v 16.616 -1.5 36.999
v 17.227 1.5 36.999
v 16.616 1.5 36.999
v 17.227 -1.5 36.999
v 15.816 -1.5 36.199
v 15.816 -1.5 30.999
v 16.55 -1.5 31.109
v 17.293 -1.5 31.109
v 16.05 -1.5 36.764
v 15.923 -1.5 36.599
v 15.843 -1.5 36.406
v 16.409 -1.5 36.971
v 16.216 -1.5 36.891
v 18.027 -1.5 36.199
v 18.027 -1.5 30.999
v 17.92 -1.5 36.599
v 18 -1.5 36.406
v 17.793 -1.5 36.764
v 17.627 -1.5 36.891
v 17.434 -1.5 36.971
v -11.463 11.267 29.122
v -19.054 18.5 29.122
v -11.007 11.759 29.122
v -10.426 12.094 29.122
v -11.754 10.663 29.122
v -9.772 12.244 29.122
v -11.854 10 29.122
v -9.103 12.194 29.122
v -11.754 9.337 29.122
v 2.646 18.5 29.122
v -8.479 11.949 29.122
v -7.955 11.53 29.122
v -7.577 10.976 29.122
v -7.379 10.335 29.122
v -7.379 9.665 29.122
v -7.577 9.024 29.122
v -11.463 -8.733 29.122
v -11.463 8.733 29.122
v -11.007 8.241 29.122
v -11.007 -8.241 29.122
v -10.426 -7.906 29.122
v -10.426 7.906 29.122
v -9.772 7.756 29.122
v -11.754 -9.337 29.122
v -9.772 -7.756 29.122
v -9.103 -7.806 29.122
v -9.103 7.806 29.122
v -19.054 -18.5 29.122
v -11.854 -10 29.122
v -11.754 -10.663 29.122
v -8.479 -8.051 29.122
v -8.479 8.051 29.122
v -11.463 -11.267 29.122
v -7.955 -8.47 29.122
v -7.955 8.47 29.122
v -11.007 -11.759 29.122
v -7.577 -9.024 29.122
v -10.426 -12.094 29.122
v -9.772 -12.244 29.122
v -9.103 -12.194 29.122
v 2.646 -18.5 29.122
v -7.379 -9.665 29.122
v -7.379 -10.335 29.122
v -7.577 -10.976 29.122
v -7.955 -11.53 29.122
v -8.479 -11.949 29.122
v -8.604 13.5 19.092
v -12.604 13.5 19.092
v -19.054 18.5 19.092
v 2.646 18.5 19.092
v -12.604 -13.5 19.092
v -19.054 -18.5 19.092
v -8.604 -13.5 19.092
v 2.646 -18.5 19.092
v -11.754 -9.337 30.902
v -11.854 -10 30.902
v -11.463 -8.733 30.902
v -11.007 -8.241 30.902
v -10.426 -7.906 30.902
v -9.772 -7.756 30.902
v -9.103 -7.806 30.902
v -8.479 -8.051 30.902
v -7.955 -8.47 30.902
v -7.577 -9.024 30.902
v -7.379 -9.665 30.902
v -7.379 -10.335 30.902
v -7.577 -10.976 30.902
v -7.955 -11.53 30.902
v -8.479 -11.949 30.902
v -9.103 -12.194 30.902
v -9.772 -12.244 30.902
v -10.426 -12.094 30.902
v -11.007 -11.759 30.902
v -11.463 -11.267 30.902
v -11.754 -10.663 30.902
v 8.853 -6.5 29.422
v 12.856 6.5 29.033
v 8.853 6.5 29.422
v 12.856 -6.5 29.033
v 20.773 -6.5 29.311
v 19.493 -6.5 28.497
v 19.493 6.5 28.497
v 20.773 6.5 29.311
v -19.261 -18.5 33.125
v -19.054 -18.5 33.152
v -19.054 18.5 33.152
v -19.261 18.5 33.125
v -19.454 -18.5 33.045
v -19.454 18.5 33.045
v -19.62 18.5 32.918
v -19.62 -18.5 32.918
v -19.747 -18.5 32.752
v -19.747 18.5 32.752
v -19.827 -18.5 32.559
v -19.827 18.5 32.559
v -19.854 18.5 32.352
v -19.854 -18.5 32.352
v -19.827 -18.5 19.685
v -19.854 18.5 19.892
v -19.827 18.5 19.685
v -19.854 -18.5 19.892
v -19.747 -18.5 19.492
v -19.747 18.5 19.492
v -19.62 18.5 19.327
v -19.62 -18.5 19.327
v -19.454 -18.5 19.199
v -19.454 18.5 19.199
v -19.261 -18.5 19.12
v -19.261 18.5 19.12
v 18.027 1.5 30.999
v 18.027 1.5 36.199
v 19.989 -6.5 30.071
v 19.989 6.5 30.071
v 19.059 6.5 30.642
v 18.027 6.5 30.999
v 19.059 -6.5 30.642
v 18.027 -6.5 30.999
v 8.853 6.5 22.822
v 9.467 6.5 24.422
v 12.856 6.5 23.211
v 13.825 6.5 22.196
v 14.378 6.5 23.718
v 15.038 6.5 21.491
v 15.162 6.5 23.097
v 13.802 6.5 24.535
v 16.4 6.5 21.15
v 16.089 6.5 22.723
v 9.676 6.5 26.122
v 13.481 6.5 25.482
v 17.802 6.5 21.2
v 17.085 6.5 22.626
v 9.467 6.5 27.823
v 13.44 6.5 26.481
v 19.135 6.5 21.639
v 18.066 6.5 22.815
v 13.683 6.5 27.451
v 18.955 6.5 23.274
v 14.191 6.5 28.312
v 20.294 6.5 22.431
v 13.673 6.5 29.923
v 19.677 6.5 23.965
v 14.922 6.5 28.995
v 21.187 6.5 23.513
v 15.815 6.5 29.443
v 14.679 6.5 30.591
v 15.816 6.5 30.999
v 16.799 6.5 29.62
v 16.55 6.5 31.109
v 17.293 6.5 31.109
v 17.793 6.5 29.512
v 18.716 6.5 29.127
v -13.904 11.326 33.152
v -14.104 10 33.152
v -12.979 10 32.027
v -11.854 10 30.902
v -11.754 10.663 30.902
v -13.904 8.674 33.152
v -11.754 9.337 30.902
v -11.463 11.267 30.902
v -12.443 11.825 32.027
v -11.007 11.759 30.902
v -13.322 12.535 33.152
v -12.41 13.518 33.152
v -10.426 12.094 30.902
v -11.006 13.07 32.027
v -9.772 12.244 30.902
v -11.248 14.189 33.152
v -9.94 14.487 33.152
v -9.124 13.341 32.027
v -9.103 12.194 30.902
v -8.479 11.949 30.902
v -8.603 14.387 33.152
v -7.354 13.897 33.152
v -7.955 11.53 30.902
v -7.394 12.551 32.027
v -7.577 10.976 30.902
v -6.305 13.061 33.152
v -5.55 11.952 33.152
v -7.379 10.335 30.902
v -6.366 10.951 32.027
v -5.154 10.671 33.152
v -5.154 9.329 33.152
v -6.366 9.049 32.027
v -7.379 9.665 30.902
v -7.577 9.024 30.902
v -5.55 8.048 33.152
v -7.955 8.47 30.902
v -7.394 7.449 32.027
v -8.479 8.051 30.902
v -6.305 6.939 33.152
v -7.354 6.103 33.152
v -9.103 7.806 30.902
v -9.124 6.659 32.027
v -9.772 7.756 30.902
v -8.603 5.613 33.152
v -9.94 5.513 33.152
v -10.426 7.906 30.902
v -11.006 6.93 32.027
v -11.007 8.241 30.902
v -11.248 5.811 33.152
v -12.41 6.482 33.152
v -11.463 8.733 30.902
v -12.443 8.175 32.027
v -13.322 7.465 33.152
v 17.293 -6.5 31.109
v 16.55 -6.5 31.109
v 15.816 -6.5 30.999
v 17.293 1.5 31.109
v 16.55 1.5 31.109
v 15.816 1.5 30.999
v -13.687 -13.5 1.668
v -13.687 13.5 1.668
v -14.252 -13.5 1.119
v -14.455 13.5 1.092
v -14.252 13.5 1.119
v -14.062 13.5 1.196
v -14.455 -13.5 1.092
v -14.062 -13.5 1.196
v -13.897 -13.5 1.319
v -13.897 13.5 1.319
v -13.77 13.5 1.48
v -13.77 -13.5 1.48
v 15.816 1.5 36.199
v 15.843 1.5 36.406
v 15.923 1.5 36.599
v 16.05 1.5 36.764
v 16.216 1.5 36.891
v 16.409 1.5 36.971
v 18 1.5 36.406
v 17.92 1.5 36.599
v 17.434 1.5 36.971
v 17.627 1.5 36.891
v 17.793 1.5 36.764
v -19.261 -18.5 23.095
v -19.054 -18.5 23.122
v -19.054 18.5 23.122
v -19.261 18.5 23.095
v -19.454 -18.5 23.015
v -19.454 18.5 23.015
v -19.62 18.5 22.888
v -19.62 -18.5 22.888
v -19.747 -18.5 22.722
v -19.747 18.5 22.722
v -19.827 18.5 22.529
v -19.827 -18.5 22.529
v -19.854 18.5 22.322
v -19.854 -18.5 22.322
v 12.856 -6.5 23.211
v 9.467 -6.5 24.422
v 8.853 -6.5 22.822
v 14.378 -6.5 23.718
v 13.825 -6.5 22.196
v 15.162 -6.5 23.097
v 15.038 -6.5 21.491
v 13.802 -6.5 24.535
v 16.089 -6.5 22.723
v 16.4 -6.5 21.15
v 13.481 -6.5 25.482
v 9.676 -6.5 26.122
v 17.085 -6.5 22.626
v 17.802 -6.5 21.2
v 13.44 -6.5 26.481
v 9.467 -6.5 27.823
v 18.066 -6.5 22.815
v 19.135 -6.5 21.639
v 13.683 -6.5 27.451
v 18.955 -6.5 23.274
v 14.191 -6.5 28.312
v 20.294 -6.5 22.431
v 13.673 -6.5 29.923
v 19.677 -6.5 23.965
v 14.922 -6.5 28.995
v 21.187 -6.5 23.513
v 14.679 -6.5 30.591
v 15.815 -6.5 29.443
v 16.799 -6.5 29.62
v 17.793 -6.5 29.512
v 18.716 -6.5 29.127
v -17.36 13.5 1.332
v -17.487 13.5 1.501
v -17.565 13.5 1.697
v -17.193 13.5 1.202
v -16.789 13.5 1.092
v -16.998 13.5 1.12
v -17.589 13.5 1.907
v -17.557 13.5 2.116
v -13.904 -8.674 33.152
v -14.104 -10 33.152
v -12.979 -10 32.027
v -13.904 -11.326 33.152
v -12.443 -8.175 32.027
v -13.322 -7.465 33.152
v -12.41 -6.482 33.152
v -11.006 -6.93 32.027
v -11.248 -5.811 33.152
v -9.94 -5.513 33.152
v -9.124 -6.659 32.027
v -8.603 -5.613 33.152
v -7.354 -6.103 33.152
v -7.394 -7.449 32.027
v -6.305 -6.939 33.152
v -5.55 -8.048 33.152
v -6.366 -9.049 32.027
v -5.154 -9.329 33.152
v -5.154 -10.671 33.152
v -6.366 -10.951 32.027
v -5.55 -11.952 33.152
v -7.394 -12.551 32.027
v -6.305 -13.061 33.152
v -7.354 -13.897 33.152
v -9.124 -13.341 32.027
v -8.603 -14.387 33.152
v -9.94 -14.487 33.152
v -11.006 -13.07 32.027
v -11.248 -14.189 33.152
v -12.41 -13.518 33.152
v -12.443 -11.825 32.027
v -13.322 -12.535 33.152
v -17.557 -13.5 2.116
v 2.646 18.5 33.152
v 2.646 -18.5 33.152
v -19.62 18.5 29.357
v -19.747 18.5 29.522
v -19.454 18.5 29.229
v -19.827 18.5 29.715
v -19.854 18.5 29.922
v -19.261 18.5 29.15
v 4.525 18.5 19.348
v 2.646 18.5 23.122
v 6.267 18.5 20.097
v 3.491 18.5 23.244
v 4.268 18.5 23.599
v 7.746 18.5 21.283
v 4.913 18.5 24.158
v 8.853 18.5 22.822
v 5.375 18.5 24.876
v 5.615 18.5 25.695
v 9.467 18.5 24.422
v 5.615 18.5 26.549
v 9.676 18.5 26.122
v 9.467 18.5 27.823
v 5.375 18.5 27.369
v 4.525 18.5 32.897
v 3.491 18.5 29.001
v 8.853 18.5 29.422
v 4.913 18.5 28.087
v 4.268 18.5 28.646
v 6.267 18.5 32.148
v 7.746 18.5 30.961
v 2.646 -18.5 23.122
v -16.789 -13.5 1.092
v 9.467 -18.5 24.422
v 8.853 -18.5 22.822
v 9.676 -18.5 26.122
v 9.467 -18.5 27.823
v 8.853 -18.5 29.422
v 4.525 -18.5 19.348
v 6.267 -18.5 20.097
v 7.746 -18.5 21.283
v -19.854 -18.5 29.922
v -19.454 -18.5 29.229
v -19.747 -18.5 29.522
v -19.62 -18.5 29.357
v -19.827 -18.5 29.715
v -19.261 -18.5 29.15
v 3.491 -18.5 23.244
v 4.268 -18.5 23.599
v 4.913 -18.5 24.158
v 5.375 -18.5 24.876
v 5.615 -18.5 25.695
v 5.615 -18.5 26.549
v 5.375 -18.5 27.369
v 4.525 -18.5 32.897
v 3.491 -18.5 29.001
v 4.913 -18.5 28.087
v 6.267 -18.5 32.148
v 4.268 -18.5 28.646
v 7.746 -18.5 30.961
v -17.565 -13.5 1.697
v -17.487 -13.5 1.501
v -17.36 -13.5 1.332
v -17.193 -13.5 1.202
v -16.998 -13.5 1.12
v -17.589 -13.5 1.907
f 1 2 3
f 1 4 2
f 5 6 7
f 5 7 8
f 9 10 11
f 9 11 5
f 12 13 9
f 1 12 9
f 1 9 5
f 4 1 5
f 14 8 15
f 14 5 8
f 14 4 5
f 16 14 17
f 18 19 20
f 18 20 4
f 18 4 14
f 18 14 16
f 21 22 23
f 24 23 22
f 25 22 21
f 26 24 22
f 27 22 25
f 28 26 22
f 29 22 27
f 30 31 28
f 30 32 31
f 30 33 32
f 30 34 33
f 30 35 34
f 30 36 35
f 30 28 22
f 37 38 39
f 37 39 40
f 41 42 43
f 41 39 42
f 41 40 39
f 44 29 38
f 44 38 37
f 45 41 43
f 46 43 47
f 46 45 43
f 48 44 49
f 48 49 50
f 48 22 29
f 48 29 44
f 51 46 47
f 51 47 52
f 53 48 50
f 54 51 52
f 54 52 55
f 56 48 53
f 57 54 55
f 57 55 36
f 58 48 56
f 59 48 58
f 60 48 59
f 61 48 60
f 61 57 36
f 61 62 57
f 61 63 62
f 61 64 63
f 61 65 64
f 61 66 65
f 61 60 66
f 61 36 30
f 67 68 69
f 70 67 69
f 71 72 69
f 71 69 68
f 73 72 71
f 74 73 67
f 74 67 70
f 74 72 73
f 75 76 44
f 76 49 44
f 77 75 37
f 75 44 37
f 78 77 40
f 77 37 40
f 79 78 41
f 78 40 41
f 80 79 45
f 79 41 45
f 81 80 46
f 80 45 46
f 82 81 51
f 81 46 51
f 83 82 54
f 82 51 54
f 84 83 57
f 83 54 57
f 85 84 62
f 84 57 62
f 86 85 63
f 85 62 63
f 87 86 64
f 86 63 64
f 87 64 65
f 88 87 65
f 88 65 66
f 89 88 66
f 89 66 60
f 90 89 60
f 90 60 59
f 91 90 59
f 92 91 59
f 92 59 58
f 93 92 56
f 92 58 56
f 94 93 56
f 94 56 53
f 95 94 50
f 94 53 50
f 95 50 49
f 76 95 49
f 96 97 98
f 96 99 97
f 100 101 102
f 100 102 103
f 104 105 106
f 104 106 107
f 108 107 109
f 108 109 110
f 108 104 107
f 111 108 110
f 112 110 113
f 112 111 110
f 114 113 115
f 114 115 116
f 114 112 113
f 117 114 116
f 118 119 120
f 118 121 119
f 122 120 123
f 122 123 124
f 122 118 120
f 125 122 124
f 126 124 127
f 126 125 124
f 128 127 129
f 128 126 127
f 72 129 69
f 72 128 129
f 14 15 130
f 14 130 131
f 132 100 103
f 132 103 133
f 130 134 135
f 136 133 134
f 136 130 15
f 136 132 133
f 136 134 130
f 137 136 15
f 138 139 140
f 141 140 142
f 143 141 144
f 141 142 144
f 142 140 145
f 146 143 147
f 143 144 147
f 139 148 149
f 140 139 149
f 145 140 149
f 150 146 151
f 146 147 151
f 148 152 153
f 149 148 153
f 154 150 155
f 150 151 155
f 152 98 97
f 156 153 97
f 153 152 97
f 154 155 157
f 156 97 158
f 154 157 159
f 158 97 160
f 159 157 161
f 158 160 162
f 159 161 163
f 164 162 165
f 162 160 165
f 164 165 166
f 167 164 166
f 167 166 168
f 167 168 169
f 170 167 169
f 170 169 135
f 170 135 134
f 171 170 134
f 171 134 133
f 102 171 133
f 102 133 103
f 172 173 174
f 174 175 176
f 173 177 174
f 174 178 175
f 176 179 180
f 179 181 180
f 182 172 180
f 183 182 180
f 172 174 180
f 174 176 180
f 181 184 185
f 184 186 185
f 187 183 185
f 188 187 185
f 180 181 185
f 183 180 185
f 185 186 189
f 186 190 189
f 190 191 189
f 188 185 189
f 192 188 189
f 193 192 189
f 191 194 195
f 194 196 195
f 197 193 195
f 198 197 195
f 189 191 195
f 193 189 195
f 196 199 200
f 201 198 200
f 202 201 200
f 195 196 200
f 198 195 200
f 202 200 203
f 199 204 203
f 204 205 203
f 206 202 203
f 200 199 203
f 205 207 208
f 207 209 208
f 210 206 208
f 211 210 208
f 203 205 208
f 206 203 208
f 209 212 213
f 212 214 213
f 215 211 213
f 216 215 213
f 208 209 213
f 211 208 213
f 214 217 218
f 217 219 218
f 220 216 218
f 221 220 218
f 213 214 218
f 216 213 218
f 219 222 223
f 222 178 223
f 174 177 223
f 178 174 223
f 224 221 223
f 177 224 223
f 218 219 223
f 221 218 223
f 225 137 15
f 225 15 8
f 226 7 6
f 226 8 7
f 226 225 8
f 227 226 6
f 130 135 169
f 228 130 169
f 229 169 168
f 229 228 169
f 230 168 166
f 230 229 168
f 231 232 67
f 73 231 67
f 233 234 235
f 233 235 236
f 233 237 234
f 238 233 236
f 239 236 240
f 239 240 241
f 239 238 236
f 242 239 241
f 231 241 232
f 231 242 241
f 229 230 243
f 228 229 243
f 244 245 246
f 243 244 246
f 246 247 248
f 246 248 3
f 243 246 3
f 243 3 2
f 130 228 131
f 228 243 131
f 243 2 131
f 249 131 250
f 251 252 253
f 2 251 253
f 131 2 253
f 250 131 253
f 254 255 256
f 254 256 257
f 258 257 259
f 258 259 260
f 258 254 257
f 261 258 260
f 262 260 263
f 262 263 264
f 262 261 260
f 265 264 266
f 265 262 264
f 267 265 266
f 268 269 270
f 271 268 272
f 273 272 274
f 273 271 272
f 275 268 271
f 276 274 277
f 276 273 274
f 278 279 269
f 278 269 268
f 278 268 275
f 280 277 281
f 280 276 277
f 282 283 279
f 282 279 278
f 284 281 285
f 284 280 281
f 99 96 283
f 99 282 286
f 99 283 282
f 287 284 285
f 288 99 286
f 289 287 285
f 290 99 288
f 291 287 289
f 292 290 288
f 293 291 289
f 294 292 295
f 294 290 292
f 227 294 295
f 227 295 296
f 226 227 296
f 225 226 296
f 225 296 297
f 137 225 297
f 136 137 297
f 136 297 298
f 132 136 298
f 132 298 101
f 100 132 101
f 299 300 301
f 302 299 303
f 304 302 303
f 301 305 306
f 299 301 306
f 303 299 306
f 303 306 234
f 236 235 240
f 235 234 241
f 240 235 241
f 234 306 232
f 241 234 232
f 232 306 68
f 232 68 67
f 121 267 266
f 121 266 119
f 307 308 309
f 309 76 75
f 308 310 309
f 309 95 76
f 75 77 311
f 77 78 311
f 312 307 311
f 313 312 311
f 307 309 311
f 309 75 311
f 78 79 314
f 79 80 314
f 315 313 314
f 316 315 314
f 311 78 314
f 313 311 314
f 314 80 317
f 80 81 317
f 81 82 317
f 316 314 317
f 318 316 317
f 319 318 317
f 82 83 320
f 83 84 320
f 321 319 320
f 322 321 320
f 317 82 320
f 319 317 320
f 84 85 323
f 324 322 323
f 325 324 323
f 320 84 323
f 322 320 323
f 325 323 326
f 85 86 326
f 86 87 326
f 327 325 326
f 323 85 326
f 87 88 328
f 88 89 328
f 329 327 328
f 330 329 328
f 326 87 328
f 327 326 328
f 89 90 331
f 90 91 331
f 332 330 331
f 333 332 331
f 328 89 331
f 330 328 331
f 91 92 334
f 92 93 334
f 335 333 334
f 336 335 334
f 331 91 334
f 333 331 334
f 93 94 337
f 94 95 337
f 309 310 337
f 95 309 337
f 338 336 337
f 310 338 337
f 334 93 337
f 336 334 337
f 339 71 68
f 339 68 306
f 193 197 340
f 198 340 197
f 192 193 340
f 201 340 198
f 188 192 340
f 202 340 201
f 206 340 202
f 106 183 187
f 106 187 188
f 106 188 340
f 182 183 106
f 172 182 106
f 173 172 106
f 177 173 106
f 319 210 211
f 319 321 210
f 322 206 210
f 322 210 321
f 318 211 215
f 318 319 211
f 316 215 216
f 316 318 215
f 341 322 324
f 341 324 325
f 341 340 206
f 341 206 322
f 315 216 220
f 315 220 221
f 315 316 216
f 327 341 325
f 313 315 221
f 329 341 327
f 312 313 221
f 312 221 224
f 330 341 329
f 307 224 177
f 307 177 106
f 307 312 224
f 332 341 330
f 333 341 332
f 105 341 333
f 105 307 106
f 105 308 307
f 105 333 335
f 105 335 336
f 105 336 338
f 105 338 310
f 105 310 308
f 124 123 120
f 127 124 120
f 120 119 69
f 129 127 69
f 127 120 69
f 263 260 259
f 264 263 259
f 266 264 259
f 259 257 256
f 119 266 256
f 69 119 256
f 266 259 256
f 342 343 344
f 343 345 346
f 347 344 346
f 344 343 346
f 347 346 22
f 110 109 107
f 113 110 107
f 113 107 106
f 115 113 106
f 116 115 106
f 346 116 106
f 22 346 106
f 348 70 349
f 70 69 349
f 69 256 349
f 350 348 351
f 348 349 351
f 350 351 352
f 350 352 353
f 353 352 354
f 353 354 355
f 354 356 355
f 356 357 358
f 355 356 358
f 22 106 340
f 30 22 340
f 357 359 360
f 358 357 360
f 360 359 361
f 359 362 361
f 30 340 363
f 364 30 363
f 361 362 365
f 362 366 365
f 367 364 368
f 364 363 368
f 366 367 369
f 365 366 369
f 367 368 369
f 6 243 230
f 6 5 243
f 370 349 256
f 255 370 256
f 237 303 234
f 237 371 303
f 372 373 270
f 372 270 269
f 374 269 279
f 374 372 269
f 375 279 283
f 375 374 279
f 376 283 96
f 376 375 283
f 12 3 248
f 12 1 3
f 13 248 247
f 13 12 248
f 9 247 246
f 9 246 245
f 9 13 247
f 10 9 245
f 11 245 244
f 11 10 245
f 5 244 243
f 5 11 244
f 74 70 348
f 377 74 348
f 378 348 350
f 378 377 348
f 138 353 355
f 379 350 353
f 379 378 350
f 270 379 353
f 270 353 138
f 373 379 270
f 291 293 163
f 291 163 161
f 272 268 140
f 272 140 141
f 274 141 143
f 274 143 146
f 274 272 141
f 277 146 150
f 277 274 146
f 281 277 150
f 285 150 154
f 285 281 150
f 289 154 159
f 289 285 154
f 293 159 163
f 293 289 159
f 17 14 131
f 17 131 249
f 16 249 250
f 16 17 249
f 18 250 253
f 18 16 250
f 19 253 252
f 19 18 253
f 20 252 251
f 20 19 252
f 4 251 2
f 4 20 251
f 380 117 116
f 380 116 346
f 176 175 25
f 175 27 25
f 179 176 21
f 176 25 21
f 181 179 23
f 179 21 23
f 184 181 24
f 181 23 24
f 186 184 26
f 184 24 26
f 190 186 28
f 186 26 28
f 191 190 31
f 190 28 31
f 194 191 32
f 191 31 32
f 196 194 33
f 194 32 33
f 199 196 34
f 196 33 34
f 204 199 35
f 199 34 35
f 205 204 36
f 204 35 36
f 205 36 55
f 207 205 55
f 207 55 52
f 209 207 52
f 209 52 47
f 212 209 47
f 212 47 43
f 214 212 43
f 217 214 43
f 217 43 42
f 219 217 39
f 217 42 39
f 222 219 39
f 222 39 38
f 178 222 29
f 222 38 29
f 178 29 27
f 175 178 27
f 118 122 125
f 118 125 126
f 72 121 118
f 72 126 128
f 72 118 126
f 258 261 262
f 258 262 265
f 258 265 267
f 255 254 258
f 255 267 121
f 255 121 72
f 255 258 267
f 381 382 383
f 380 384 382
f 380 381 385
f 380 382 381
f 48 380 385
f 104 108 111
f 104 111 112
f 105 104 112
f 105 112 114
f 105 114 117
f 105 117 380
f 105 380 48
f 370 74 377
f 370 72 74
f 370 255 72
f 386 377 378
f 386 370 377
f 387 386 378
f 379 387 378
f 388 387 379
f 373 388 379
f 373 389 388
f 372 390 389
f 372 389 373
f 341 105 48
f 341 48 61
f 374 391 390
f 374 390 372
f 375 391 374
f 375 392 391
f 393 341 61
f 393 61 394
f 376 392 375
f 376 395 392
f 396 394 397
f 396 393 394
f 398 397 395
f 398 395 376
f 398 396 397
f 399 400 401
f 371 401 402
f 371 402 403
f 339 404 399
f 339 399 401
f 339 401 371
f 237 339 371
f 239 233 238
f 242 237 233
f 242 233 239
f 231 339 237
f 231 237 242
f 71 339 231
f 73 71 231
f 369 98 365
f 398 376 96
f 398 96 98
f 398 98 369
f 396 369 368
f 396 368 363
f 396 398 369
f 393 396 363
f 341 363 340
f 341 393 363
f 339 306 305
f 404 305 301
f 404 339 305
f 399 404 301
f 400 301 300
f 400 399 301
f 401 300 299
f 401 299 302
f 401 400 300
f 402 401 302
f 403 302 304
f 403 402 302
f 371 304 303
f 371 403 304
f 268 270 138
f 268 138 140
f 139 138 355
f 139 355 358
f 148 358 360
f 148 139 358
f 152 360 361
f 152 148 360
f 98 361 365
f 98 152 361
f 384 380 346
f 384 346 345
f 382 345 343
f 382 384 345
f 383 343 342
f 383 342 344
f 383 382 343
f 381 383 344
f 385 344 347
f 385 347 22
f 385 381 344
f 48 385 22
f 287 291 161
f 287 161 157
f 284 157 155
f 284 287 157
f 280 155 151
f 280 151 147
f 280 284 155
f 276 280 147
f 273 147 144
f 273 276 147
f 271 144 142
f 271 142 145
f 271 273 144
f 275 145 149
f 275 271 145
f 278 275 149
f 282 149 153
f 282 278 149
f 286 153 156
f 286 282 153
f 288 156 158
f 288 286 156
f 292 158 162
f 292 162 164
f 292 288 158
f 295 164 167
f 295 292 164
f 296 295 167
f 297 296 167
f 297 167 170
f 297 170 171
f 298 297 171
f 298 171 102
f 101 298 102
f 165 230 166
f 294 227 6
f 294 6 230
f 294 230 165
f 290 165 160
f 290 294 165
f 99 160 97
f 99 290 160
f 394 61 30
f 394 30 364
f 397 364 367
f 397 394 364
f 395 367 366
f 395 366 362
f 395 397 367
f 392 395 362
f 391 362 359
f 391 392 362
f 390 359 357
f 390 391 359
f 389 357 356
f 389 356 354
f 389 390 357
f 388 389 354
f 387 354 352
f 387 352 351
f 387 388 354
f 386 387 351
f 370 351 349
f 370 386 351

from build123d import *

# Parameters (mm, degrees)
F1_DEPTH       = 18.5
F2_DEPTH       = 6.5
F3_DEPTH       = 1.5
F4_DEPTH       = 13.5
F6_D           = 4.5
F6_DEPTH       = 7
F6_CSINK_D     = 9
F6_CSINK_ANGLE = 90


with BuildPart() as f1:
    # F0 (on Front) → F1 (new body, symmetric)
    with BuildSketch(Plane.XZ):
        with BuildLine():
            Line((-8.603998, 19.092317), (2.646002, 19.092317))
            ThreePointArc((2.646002, 19.092317), (6.266849, 20.096509), (8.853265, 22.822198))
            ThreePointArc((8.853265, 22.822198), (9.676002, 26.122317), (8.853265, 29.422437))
            ThreePointArc((8.853265, 29.422437), (6.266849, 32.148126), (2.646002, 33.152317))
            Line((2.646002, 33.152317), (-19.053998, 33.152317))
            ThreePointArc((-19.053998, 33.152317), (-19.619683, 32.918003), (-19.853998, 32.352317))
            Line((-19.853998, 32.352317), (-19.853998, 29.922317))
            ThreePointArc((-19.853998, 29.922317), (-19.619683, 29.356632), (-19.053998, 29.122317))
            Line((-19.053998, 29.122317), (2.646002, 29.122317))
            ThreePointArc((2.646002, 29.122317), (5.646002, 26.122317), (2.646002, 23.122317))
            Line((2.646002, 23.122317), (-19.053998, 23.122317))
            ThreePointArc((-19.053998, 23.122317), (-19.619683, 22.888003), (-19.853998, 22.322317))
            Line((-19.853998, 22.322317), (-19.853998, 19.892317))
            ThreePointArc((-19.853998, 19.892317), (-19.619683, 19.326632), (-19.053998, 19.092317))
            Line((-19.053998, 19.092317), (-12.603998, 19.092317))
            Line((-12.603998, 19.092317), (-8.603998, 19.092317))
        make_face()
    extrude(amount=F1_DEPTH, both=True)

    # F0 (on Front) → F2 (join, symmetric)
    with BuildSketch(Plane.XZ):
        with BuildLine():
            ThreePointArc((8.853265, 29.422437), (9.676002, 26.122317), (8.853265, 22.822198))
            Line((8.853265, 22.822198), (12.856312, 23.211387))
            ThreePointArc((12.856312, 23.211387), (11.92159, 26.122317), (12.856312, 29.033247))
            Line((12.856312, 29.033247), (8.853265, 29.422437))
        make_face()
        with BuildLine():
            ThreePointArc((12.856312, 29.033247), (11.92159, 26.122317), (12.856312, 23.211387))
            ThreePointArc((12.856312, 23.211387), (17.102599, 21.125595), (21.186836, 23.513164))
            Line((21.186836, 23.513164), (19.677439, 23.964703))
            ThreePointArc((19.677439, 23.964703), (13.424495, 25.979745), (19.492658, 28.497104))
            Line((19.492658, 28.497104), (20.773135, 29.310671))
            ThreePointArc((20.773135, 29.310671), (19.539969, 30.381905), (18.027346, 30.998515))
            ThreePointArc((18.027346, 30.998515), (16.92159, 31.122317), (15.815834, 30.998515))
            ThreePointArc((15.815834, 30.998515), (14.155642, 30.287594), (12.856312, 29.033247))
        make_face()
    extrude(amount=F2_DEPTH, both=True)

    # F0 (on Front) → F3 (join, symmetric)
    with BuildSketch(Plane.XZ):
        with BuildLine():
            Line((15.815834, 36.198515), (15.815834, 30.998515))
            ThreePointArc((15.815834, 30.998515), (16.92159, 31.122317), (18.027346, 30.998515))
            Line((18.027346, 30.998515), (18.027346, 36.198515))
            ThreePointArc((18.027346, 36.198515), (17.793031, 36.7642), (17.227346, 36.998515))
            Line((17.227346, 36.998515), (16.615834, 36.998515))
            ThreePointArc((16.615834, 36.998515), (16.050149, 36.7642), (15.815834, 36.198515))
        make_face()
    extrude(amount=F3_DEPTH, both=True)

    # F0 (on Front) → F4 (join, symmetric)
    with BuildSketch(Plane.XZ):
        with BuildLine():
            Line((-13.68744, 1.668259), (-8.603998, 19.092317))
            Line((-8.603998, 19.092317), (-12.603998, 19.092317))
            Line((-12.603998, 19.092317), (-17.556703, 2.116375))
            ThreePointArc((-17.556703, 2.116375), (-17.428738, 1.412341), (-16.78872, 1.092317))
            Line((-16.78872, 1.092317), (-14.455423, 1.092317))
            ThreePointArc((-14.455423, 1.092317), (-13.975447, 1.252299), (-13.68744, 1.668259))
        make_face()
    extrude(amount=F4_DEPTH, both=True)

    # F6
    with Locations(Plane.XY.offset(33.152317)):
        with Locations((-9.603998, 10), (-9.603998, -10)):
            CounterSinkHole(F6_D / 2, F6_CSINK_D / 2, depth=F6_DEPTH, counter_sink_angle=F6_CSINK_ANGLE)


solid = f1.part
